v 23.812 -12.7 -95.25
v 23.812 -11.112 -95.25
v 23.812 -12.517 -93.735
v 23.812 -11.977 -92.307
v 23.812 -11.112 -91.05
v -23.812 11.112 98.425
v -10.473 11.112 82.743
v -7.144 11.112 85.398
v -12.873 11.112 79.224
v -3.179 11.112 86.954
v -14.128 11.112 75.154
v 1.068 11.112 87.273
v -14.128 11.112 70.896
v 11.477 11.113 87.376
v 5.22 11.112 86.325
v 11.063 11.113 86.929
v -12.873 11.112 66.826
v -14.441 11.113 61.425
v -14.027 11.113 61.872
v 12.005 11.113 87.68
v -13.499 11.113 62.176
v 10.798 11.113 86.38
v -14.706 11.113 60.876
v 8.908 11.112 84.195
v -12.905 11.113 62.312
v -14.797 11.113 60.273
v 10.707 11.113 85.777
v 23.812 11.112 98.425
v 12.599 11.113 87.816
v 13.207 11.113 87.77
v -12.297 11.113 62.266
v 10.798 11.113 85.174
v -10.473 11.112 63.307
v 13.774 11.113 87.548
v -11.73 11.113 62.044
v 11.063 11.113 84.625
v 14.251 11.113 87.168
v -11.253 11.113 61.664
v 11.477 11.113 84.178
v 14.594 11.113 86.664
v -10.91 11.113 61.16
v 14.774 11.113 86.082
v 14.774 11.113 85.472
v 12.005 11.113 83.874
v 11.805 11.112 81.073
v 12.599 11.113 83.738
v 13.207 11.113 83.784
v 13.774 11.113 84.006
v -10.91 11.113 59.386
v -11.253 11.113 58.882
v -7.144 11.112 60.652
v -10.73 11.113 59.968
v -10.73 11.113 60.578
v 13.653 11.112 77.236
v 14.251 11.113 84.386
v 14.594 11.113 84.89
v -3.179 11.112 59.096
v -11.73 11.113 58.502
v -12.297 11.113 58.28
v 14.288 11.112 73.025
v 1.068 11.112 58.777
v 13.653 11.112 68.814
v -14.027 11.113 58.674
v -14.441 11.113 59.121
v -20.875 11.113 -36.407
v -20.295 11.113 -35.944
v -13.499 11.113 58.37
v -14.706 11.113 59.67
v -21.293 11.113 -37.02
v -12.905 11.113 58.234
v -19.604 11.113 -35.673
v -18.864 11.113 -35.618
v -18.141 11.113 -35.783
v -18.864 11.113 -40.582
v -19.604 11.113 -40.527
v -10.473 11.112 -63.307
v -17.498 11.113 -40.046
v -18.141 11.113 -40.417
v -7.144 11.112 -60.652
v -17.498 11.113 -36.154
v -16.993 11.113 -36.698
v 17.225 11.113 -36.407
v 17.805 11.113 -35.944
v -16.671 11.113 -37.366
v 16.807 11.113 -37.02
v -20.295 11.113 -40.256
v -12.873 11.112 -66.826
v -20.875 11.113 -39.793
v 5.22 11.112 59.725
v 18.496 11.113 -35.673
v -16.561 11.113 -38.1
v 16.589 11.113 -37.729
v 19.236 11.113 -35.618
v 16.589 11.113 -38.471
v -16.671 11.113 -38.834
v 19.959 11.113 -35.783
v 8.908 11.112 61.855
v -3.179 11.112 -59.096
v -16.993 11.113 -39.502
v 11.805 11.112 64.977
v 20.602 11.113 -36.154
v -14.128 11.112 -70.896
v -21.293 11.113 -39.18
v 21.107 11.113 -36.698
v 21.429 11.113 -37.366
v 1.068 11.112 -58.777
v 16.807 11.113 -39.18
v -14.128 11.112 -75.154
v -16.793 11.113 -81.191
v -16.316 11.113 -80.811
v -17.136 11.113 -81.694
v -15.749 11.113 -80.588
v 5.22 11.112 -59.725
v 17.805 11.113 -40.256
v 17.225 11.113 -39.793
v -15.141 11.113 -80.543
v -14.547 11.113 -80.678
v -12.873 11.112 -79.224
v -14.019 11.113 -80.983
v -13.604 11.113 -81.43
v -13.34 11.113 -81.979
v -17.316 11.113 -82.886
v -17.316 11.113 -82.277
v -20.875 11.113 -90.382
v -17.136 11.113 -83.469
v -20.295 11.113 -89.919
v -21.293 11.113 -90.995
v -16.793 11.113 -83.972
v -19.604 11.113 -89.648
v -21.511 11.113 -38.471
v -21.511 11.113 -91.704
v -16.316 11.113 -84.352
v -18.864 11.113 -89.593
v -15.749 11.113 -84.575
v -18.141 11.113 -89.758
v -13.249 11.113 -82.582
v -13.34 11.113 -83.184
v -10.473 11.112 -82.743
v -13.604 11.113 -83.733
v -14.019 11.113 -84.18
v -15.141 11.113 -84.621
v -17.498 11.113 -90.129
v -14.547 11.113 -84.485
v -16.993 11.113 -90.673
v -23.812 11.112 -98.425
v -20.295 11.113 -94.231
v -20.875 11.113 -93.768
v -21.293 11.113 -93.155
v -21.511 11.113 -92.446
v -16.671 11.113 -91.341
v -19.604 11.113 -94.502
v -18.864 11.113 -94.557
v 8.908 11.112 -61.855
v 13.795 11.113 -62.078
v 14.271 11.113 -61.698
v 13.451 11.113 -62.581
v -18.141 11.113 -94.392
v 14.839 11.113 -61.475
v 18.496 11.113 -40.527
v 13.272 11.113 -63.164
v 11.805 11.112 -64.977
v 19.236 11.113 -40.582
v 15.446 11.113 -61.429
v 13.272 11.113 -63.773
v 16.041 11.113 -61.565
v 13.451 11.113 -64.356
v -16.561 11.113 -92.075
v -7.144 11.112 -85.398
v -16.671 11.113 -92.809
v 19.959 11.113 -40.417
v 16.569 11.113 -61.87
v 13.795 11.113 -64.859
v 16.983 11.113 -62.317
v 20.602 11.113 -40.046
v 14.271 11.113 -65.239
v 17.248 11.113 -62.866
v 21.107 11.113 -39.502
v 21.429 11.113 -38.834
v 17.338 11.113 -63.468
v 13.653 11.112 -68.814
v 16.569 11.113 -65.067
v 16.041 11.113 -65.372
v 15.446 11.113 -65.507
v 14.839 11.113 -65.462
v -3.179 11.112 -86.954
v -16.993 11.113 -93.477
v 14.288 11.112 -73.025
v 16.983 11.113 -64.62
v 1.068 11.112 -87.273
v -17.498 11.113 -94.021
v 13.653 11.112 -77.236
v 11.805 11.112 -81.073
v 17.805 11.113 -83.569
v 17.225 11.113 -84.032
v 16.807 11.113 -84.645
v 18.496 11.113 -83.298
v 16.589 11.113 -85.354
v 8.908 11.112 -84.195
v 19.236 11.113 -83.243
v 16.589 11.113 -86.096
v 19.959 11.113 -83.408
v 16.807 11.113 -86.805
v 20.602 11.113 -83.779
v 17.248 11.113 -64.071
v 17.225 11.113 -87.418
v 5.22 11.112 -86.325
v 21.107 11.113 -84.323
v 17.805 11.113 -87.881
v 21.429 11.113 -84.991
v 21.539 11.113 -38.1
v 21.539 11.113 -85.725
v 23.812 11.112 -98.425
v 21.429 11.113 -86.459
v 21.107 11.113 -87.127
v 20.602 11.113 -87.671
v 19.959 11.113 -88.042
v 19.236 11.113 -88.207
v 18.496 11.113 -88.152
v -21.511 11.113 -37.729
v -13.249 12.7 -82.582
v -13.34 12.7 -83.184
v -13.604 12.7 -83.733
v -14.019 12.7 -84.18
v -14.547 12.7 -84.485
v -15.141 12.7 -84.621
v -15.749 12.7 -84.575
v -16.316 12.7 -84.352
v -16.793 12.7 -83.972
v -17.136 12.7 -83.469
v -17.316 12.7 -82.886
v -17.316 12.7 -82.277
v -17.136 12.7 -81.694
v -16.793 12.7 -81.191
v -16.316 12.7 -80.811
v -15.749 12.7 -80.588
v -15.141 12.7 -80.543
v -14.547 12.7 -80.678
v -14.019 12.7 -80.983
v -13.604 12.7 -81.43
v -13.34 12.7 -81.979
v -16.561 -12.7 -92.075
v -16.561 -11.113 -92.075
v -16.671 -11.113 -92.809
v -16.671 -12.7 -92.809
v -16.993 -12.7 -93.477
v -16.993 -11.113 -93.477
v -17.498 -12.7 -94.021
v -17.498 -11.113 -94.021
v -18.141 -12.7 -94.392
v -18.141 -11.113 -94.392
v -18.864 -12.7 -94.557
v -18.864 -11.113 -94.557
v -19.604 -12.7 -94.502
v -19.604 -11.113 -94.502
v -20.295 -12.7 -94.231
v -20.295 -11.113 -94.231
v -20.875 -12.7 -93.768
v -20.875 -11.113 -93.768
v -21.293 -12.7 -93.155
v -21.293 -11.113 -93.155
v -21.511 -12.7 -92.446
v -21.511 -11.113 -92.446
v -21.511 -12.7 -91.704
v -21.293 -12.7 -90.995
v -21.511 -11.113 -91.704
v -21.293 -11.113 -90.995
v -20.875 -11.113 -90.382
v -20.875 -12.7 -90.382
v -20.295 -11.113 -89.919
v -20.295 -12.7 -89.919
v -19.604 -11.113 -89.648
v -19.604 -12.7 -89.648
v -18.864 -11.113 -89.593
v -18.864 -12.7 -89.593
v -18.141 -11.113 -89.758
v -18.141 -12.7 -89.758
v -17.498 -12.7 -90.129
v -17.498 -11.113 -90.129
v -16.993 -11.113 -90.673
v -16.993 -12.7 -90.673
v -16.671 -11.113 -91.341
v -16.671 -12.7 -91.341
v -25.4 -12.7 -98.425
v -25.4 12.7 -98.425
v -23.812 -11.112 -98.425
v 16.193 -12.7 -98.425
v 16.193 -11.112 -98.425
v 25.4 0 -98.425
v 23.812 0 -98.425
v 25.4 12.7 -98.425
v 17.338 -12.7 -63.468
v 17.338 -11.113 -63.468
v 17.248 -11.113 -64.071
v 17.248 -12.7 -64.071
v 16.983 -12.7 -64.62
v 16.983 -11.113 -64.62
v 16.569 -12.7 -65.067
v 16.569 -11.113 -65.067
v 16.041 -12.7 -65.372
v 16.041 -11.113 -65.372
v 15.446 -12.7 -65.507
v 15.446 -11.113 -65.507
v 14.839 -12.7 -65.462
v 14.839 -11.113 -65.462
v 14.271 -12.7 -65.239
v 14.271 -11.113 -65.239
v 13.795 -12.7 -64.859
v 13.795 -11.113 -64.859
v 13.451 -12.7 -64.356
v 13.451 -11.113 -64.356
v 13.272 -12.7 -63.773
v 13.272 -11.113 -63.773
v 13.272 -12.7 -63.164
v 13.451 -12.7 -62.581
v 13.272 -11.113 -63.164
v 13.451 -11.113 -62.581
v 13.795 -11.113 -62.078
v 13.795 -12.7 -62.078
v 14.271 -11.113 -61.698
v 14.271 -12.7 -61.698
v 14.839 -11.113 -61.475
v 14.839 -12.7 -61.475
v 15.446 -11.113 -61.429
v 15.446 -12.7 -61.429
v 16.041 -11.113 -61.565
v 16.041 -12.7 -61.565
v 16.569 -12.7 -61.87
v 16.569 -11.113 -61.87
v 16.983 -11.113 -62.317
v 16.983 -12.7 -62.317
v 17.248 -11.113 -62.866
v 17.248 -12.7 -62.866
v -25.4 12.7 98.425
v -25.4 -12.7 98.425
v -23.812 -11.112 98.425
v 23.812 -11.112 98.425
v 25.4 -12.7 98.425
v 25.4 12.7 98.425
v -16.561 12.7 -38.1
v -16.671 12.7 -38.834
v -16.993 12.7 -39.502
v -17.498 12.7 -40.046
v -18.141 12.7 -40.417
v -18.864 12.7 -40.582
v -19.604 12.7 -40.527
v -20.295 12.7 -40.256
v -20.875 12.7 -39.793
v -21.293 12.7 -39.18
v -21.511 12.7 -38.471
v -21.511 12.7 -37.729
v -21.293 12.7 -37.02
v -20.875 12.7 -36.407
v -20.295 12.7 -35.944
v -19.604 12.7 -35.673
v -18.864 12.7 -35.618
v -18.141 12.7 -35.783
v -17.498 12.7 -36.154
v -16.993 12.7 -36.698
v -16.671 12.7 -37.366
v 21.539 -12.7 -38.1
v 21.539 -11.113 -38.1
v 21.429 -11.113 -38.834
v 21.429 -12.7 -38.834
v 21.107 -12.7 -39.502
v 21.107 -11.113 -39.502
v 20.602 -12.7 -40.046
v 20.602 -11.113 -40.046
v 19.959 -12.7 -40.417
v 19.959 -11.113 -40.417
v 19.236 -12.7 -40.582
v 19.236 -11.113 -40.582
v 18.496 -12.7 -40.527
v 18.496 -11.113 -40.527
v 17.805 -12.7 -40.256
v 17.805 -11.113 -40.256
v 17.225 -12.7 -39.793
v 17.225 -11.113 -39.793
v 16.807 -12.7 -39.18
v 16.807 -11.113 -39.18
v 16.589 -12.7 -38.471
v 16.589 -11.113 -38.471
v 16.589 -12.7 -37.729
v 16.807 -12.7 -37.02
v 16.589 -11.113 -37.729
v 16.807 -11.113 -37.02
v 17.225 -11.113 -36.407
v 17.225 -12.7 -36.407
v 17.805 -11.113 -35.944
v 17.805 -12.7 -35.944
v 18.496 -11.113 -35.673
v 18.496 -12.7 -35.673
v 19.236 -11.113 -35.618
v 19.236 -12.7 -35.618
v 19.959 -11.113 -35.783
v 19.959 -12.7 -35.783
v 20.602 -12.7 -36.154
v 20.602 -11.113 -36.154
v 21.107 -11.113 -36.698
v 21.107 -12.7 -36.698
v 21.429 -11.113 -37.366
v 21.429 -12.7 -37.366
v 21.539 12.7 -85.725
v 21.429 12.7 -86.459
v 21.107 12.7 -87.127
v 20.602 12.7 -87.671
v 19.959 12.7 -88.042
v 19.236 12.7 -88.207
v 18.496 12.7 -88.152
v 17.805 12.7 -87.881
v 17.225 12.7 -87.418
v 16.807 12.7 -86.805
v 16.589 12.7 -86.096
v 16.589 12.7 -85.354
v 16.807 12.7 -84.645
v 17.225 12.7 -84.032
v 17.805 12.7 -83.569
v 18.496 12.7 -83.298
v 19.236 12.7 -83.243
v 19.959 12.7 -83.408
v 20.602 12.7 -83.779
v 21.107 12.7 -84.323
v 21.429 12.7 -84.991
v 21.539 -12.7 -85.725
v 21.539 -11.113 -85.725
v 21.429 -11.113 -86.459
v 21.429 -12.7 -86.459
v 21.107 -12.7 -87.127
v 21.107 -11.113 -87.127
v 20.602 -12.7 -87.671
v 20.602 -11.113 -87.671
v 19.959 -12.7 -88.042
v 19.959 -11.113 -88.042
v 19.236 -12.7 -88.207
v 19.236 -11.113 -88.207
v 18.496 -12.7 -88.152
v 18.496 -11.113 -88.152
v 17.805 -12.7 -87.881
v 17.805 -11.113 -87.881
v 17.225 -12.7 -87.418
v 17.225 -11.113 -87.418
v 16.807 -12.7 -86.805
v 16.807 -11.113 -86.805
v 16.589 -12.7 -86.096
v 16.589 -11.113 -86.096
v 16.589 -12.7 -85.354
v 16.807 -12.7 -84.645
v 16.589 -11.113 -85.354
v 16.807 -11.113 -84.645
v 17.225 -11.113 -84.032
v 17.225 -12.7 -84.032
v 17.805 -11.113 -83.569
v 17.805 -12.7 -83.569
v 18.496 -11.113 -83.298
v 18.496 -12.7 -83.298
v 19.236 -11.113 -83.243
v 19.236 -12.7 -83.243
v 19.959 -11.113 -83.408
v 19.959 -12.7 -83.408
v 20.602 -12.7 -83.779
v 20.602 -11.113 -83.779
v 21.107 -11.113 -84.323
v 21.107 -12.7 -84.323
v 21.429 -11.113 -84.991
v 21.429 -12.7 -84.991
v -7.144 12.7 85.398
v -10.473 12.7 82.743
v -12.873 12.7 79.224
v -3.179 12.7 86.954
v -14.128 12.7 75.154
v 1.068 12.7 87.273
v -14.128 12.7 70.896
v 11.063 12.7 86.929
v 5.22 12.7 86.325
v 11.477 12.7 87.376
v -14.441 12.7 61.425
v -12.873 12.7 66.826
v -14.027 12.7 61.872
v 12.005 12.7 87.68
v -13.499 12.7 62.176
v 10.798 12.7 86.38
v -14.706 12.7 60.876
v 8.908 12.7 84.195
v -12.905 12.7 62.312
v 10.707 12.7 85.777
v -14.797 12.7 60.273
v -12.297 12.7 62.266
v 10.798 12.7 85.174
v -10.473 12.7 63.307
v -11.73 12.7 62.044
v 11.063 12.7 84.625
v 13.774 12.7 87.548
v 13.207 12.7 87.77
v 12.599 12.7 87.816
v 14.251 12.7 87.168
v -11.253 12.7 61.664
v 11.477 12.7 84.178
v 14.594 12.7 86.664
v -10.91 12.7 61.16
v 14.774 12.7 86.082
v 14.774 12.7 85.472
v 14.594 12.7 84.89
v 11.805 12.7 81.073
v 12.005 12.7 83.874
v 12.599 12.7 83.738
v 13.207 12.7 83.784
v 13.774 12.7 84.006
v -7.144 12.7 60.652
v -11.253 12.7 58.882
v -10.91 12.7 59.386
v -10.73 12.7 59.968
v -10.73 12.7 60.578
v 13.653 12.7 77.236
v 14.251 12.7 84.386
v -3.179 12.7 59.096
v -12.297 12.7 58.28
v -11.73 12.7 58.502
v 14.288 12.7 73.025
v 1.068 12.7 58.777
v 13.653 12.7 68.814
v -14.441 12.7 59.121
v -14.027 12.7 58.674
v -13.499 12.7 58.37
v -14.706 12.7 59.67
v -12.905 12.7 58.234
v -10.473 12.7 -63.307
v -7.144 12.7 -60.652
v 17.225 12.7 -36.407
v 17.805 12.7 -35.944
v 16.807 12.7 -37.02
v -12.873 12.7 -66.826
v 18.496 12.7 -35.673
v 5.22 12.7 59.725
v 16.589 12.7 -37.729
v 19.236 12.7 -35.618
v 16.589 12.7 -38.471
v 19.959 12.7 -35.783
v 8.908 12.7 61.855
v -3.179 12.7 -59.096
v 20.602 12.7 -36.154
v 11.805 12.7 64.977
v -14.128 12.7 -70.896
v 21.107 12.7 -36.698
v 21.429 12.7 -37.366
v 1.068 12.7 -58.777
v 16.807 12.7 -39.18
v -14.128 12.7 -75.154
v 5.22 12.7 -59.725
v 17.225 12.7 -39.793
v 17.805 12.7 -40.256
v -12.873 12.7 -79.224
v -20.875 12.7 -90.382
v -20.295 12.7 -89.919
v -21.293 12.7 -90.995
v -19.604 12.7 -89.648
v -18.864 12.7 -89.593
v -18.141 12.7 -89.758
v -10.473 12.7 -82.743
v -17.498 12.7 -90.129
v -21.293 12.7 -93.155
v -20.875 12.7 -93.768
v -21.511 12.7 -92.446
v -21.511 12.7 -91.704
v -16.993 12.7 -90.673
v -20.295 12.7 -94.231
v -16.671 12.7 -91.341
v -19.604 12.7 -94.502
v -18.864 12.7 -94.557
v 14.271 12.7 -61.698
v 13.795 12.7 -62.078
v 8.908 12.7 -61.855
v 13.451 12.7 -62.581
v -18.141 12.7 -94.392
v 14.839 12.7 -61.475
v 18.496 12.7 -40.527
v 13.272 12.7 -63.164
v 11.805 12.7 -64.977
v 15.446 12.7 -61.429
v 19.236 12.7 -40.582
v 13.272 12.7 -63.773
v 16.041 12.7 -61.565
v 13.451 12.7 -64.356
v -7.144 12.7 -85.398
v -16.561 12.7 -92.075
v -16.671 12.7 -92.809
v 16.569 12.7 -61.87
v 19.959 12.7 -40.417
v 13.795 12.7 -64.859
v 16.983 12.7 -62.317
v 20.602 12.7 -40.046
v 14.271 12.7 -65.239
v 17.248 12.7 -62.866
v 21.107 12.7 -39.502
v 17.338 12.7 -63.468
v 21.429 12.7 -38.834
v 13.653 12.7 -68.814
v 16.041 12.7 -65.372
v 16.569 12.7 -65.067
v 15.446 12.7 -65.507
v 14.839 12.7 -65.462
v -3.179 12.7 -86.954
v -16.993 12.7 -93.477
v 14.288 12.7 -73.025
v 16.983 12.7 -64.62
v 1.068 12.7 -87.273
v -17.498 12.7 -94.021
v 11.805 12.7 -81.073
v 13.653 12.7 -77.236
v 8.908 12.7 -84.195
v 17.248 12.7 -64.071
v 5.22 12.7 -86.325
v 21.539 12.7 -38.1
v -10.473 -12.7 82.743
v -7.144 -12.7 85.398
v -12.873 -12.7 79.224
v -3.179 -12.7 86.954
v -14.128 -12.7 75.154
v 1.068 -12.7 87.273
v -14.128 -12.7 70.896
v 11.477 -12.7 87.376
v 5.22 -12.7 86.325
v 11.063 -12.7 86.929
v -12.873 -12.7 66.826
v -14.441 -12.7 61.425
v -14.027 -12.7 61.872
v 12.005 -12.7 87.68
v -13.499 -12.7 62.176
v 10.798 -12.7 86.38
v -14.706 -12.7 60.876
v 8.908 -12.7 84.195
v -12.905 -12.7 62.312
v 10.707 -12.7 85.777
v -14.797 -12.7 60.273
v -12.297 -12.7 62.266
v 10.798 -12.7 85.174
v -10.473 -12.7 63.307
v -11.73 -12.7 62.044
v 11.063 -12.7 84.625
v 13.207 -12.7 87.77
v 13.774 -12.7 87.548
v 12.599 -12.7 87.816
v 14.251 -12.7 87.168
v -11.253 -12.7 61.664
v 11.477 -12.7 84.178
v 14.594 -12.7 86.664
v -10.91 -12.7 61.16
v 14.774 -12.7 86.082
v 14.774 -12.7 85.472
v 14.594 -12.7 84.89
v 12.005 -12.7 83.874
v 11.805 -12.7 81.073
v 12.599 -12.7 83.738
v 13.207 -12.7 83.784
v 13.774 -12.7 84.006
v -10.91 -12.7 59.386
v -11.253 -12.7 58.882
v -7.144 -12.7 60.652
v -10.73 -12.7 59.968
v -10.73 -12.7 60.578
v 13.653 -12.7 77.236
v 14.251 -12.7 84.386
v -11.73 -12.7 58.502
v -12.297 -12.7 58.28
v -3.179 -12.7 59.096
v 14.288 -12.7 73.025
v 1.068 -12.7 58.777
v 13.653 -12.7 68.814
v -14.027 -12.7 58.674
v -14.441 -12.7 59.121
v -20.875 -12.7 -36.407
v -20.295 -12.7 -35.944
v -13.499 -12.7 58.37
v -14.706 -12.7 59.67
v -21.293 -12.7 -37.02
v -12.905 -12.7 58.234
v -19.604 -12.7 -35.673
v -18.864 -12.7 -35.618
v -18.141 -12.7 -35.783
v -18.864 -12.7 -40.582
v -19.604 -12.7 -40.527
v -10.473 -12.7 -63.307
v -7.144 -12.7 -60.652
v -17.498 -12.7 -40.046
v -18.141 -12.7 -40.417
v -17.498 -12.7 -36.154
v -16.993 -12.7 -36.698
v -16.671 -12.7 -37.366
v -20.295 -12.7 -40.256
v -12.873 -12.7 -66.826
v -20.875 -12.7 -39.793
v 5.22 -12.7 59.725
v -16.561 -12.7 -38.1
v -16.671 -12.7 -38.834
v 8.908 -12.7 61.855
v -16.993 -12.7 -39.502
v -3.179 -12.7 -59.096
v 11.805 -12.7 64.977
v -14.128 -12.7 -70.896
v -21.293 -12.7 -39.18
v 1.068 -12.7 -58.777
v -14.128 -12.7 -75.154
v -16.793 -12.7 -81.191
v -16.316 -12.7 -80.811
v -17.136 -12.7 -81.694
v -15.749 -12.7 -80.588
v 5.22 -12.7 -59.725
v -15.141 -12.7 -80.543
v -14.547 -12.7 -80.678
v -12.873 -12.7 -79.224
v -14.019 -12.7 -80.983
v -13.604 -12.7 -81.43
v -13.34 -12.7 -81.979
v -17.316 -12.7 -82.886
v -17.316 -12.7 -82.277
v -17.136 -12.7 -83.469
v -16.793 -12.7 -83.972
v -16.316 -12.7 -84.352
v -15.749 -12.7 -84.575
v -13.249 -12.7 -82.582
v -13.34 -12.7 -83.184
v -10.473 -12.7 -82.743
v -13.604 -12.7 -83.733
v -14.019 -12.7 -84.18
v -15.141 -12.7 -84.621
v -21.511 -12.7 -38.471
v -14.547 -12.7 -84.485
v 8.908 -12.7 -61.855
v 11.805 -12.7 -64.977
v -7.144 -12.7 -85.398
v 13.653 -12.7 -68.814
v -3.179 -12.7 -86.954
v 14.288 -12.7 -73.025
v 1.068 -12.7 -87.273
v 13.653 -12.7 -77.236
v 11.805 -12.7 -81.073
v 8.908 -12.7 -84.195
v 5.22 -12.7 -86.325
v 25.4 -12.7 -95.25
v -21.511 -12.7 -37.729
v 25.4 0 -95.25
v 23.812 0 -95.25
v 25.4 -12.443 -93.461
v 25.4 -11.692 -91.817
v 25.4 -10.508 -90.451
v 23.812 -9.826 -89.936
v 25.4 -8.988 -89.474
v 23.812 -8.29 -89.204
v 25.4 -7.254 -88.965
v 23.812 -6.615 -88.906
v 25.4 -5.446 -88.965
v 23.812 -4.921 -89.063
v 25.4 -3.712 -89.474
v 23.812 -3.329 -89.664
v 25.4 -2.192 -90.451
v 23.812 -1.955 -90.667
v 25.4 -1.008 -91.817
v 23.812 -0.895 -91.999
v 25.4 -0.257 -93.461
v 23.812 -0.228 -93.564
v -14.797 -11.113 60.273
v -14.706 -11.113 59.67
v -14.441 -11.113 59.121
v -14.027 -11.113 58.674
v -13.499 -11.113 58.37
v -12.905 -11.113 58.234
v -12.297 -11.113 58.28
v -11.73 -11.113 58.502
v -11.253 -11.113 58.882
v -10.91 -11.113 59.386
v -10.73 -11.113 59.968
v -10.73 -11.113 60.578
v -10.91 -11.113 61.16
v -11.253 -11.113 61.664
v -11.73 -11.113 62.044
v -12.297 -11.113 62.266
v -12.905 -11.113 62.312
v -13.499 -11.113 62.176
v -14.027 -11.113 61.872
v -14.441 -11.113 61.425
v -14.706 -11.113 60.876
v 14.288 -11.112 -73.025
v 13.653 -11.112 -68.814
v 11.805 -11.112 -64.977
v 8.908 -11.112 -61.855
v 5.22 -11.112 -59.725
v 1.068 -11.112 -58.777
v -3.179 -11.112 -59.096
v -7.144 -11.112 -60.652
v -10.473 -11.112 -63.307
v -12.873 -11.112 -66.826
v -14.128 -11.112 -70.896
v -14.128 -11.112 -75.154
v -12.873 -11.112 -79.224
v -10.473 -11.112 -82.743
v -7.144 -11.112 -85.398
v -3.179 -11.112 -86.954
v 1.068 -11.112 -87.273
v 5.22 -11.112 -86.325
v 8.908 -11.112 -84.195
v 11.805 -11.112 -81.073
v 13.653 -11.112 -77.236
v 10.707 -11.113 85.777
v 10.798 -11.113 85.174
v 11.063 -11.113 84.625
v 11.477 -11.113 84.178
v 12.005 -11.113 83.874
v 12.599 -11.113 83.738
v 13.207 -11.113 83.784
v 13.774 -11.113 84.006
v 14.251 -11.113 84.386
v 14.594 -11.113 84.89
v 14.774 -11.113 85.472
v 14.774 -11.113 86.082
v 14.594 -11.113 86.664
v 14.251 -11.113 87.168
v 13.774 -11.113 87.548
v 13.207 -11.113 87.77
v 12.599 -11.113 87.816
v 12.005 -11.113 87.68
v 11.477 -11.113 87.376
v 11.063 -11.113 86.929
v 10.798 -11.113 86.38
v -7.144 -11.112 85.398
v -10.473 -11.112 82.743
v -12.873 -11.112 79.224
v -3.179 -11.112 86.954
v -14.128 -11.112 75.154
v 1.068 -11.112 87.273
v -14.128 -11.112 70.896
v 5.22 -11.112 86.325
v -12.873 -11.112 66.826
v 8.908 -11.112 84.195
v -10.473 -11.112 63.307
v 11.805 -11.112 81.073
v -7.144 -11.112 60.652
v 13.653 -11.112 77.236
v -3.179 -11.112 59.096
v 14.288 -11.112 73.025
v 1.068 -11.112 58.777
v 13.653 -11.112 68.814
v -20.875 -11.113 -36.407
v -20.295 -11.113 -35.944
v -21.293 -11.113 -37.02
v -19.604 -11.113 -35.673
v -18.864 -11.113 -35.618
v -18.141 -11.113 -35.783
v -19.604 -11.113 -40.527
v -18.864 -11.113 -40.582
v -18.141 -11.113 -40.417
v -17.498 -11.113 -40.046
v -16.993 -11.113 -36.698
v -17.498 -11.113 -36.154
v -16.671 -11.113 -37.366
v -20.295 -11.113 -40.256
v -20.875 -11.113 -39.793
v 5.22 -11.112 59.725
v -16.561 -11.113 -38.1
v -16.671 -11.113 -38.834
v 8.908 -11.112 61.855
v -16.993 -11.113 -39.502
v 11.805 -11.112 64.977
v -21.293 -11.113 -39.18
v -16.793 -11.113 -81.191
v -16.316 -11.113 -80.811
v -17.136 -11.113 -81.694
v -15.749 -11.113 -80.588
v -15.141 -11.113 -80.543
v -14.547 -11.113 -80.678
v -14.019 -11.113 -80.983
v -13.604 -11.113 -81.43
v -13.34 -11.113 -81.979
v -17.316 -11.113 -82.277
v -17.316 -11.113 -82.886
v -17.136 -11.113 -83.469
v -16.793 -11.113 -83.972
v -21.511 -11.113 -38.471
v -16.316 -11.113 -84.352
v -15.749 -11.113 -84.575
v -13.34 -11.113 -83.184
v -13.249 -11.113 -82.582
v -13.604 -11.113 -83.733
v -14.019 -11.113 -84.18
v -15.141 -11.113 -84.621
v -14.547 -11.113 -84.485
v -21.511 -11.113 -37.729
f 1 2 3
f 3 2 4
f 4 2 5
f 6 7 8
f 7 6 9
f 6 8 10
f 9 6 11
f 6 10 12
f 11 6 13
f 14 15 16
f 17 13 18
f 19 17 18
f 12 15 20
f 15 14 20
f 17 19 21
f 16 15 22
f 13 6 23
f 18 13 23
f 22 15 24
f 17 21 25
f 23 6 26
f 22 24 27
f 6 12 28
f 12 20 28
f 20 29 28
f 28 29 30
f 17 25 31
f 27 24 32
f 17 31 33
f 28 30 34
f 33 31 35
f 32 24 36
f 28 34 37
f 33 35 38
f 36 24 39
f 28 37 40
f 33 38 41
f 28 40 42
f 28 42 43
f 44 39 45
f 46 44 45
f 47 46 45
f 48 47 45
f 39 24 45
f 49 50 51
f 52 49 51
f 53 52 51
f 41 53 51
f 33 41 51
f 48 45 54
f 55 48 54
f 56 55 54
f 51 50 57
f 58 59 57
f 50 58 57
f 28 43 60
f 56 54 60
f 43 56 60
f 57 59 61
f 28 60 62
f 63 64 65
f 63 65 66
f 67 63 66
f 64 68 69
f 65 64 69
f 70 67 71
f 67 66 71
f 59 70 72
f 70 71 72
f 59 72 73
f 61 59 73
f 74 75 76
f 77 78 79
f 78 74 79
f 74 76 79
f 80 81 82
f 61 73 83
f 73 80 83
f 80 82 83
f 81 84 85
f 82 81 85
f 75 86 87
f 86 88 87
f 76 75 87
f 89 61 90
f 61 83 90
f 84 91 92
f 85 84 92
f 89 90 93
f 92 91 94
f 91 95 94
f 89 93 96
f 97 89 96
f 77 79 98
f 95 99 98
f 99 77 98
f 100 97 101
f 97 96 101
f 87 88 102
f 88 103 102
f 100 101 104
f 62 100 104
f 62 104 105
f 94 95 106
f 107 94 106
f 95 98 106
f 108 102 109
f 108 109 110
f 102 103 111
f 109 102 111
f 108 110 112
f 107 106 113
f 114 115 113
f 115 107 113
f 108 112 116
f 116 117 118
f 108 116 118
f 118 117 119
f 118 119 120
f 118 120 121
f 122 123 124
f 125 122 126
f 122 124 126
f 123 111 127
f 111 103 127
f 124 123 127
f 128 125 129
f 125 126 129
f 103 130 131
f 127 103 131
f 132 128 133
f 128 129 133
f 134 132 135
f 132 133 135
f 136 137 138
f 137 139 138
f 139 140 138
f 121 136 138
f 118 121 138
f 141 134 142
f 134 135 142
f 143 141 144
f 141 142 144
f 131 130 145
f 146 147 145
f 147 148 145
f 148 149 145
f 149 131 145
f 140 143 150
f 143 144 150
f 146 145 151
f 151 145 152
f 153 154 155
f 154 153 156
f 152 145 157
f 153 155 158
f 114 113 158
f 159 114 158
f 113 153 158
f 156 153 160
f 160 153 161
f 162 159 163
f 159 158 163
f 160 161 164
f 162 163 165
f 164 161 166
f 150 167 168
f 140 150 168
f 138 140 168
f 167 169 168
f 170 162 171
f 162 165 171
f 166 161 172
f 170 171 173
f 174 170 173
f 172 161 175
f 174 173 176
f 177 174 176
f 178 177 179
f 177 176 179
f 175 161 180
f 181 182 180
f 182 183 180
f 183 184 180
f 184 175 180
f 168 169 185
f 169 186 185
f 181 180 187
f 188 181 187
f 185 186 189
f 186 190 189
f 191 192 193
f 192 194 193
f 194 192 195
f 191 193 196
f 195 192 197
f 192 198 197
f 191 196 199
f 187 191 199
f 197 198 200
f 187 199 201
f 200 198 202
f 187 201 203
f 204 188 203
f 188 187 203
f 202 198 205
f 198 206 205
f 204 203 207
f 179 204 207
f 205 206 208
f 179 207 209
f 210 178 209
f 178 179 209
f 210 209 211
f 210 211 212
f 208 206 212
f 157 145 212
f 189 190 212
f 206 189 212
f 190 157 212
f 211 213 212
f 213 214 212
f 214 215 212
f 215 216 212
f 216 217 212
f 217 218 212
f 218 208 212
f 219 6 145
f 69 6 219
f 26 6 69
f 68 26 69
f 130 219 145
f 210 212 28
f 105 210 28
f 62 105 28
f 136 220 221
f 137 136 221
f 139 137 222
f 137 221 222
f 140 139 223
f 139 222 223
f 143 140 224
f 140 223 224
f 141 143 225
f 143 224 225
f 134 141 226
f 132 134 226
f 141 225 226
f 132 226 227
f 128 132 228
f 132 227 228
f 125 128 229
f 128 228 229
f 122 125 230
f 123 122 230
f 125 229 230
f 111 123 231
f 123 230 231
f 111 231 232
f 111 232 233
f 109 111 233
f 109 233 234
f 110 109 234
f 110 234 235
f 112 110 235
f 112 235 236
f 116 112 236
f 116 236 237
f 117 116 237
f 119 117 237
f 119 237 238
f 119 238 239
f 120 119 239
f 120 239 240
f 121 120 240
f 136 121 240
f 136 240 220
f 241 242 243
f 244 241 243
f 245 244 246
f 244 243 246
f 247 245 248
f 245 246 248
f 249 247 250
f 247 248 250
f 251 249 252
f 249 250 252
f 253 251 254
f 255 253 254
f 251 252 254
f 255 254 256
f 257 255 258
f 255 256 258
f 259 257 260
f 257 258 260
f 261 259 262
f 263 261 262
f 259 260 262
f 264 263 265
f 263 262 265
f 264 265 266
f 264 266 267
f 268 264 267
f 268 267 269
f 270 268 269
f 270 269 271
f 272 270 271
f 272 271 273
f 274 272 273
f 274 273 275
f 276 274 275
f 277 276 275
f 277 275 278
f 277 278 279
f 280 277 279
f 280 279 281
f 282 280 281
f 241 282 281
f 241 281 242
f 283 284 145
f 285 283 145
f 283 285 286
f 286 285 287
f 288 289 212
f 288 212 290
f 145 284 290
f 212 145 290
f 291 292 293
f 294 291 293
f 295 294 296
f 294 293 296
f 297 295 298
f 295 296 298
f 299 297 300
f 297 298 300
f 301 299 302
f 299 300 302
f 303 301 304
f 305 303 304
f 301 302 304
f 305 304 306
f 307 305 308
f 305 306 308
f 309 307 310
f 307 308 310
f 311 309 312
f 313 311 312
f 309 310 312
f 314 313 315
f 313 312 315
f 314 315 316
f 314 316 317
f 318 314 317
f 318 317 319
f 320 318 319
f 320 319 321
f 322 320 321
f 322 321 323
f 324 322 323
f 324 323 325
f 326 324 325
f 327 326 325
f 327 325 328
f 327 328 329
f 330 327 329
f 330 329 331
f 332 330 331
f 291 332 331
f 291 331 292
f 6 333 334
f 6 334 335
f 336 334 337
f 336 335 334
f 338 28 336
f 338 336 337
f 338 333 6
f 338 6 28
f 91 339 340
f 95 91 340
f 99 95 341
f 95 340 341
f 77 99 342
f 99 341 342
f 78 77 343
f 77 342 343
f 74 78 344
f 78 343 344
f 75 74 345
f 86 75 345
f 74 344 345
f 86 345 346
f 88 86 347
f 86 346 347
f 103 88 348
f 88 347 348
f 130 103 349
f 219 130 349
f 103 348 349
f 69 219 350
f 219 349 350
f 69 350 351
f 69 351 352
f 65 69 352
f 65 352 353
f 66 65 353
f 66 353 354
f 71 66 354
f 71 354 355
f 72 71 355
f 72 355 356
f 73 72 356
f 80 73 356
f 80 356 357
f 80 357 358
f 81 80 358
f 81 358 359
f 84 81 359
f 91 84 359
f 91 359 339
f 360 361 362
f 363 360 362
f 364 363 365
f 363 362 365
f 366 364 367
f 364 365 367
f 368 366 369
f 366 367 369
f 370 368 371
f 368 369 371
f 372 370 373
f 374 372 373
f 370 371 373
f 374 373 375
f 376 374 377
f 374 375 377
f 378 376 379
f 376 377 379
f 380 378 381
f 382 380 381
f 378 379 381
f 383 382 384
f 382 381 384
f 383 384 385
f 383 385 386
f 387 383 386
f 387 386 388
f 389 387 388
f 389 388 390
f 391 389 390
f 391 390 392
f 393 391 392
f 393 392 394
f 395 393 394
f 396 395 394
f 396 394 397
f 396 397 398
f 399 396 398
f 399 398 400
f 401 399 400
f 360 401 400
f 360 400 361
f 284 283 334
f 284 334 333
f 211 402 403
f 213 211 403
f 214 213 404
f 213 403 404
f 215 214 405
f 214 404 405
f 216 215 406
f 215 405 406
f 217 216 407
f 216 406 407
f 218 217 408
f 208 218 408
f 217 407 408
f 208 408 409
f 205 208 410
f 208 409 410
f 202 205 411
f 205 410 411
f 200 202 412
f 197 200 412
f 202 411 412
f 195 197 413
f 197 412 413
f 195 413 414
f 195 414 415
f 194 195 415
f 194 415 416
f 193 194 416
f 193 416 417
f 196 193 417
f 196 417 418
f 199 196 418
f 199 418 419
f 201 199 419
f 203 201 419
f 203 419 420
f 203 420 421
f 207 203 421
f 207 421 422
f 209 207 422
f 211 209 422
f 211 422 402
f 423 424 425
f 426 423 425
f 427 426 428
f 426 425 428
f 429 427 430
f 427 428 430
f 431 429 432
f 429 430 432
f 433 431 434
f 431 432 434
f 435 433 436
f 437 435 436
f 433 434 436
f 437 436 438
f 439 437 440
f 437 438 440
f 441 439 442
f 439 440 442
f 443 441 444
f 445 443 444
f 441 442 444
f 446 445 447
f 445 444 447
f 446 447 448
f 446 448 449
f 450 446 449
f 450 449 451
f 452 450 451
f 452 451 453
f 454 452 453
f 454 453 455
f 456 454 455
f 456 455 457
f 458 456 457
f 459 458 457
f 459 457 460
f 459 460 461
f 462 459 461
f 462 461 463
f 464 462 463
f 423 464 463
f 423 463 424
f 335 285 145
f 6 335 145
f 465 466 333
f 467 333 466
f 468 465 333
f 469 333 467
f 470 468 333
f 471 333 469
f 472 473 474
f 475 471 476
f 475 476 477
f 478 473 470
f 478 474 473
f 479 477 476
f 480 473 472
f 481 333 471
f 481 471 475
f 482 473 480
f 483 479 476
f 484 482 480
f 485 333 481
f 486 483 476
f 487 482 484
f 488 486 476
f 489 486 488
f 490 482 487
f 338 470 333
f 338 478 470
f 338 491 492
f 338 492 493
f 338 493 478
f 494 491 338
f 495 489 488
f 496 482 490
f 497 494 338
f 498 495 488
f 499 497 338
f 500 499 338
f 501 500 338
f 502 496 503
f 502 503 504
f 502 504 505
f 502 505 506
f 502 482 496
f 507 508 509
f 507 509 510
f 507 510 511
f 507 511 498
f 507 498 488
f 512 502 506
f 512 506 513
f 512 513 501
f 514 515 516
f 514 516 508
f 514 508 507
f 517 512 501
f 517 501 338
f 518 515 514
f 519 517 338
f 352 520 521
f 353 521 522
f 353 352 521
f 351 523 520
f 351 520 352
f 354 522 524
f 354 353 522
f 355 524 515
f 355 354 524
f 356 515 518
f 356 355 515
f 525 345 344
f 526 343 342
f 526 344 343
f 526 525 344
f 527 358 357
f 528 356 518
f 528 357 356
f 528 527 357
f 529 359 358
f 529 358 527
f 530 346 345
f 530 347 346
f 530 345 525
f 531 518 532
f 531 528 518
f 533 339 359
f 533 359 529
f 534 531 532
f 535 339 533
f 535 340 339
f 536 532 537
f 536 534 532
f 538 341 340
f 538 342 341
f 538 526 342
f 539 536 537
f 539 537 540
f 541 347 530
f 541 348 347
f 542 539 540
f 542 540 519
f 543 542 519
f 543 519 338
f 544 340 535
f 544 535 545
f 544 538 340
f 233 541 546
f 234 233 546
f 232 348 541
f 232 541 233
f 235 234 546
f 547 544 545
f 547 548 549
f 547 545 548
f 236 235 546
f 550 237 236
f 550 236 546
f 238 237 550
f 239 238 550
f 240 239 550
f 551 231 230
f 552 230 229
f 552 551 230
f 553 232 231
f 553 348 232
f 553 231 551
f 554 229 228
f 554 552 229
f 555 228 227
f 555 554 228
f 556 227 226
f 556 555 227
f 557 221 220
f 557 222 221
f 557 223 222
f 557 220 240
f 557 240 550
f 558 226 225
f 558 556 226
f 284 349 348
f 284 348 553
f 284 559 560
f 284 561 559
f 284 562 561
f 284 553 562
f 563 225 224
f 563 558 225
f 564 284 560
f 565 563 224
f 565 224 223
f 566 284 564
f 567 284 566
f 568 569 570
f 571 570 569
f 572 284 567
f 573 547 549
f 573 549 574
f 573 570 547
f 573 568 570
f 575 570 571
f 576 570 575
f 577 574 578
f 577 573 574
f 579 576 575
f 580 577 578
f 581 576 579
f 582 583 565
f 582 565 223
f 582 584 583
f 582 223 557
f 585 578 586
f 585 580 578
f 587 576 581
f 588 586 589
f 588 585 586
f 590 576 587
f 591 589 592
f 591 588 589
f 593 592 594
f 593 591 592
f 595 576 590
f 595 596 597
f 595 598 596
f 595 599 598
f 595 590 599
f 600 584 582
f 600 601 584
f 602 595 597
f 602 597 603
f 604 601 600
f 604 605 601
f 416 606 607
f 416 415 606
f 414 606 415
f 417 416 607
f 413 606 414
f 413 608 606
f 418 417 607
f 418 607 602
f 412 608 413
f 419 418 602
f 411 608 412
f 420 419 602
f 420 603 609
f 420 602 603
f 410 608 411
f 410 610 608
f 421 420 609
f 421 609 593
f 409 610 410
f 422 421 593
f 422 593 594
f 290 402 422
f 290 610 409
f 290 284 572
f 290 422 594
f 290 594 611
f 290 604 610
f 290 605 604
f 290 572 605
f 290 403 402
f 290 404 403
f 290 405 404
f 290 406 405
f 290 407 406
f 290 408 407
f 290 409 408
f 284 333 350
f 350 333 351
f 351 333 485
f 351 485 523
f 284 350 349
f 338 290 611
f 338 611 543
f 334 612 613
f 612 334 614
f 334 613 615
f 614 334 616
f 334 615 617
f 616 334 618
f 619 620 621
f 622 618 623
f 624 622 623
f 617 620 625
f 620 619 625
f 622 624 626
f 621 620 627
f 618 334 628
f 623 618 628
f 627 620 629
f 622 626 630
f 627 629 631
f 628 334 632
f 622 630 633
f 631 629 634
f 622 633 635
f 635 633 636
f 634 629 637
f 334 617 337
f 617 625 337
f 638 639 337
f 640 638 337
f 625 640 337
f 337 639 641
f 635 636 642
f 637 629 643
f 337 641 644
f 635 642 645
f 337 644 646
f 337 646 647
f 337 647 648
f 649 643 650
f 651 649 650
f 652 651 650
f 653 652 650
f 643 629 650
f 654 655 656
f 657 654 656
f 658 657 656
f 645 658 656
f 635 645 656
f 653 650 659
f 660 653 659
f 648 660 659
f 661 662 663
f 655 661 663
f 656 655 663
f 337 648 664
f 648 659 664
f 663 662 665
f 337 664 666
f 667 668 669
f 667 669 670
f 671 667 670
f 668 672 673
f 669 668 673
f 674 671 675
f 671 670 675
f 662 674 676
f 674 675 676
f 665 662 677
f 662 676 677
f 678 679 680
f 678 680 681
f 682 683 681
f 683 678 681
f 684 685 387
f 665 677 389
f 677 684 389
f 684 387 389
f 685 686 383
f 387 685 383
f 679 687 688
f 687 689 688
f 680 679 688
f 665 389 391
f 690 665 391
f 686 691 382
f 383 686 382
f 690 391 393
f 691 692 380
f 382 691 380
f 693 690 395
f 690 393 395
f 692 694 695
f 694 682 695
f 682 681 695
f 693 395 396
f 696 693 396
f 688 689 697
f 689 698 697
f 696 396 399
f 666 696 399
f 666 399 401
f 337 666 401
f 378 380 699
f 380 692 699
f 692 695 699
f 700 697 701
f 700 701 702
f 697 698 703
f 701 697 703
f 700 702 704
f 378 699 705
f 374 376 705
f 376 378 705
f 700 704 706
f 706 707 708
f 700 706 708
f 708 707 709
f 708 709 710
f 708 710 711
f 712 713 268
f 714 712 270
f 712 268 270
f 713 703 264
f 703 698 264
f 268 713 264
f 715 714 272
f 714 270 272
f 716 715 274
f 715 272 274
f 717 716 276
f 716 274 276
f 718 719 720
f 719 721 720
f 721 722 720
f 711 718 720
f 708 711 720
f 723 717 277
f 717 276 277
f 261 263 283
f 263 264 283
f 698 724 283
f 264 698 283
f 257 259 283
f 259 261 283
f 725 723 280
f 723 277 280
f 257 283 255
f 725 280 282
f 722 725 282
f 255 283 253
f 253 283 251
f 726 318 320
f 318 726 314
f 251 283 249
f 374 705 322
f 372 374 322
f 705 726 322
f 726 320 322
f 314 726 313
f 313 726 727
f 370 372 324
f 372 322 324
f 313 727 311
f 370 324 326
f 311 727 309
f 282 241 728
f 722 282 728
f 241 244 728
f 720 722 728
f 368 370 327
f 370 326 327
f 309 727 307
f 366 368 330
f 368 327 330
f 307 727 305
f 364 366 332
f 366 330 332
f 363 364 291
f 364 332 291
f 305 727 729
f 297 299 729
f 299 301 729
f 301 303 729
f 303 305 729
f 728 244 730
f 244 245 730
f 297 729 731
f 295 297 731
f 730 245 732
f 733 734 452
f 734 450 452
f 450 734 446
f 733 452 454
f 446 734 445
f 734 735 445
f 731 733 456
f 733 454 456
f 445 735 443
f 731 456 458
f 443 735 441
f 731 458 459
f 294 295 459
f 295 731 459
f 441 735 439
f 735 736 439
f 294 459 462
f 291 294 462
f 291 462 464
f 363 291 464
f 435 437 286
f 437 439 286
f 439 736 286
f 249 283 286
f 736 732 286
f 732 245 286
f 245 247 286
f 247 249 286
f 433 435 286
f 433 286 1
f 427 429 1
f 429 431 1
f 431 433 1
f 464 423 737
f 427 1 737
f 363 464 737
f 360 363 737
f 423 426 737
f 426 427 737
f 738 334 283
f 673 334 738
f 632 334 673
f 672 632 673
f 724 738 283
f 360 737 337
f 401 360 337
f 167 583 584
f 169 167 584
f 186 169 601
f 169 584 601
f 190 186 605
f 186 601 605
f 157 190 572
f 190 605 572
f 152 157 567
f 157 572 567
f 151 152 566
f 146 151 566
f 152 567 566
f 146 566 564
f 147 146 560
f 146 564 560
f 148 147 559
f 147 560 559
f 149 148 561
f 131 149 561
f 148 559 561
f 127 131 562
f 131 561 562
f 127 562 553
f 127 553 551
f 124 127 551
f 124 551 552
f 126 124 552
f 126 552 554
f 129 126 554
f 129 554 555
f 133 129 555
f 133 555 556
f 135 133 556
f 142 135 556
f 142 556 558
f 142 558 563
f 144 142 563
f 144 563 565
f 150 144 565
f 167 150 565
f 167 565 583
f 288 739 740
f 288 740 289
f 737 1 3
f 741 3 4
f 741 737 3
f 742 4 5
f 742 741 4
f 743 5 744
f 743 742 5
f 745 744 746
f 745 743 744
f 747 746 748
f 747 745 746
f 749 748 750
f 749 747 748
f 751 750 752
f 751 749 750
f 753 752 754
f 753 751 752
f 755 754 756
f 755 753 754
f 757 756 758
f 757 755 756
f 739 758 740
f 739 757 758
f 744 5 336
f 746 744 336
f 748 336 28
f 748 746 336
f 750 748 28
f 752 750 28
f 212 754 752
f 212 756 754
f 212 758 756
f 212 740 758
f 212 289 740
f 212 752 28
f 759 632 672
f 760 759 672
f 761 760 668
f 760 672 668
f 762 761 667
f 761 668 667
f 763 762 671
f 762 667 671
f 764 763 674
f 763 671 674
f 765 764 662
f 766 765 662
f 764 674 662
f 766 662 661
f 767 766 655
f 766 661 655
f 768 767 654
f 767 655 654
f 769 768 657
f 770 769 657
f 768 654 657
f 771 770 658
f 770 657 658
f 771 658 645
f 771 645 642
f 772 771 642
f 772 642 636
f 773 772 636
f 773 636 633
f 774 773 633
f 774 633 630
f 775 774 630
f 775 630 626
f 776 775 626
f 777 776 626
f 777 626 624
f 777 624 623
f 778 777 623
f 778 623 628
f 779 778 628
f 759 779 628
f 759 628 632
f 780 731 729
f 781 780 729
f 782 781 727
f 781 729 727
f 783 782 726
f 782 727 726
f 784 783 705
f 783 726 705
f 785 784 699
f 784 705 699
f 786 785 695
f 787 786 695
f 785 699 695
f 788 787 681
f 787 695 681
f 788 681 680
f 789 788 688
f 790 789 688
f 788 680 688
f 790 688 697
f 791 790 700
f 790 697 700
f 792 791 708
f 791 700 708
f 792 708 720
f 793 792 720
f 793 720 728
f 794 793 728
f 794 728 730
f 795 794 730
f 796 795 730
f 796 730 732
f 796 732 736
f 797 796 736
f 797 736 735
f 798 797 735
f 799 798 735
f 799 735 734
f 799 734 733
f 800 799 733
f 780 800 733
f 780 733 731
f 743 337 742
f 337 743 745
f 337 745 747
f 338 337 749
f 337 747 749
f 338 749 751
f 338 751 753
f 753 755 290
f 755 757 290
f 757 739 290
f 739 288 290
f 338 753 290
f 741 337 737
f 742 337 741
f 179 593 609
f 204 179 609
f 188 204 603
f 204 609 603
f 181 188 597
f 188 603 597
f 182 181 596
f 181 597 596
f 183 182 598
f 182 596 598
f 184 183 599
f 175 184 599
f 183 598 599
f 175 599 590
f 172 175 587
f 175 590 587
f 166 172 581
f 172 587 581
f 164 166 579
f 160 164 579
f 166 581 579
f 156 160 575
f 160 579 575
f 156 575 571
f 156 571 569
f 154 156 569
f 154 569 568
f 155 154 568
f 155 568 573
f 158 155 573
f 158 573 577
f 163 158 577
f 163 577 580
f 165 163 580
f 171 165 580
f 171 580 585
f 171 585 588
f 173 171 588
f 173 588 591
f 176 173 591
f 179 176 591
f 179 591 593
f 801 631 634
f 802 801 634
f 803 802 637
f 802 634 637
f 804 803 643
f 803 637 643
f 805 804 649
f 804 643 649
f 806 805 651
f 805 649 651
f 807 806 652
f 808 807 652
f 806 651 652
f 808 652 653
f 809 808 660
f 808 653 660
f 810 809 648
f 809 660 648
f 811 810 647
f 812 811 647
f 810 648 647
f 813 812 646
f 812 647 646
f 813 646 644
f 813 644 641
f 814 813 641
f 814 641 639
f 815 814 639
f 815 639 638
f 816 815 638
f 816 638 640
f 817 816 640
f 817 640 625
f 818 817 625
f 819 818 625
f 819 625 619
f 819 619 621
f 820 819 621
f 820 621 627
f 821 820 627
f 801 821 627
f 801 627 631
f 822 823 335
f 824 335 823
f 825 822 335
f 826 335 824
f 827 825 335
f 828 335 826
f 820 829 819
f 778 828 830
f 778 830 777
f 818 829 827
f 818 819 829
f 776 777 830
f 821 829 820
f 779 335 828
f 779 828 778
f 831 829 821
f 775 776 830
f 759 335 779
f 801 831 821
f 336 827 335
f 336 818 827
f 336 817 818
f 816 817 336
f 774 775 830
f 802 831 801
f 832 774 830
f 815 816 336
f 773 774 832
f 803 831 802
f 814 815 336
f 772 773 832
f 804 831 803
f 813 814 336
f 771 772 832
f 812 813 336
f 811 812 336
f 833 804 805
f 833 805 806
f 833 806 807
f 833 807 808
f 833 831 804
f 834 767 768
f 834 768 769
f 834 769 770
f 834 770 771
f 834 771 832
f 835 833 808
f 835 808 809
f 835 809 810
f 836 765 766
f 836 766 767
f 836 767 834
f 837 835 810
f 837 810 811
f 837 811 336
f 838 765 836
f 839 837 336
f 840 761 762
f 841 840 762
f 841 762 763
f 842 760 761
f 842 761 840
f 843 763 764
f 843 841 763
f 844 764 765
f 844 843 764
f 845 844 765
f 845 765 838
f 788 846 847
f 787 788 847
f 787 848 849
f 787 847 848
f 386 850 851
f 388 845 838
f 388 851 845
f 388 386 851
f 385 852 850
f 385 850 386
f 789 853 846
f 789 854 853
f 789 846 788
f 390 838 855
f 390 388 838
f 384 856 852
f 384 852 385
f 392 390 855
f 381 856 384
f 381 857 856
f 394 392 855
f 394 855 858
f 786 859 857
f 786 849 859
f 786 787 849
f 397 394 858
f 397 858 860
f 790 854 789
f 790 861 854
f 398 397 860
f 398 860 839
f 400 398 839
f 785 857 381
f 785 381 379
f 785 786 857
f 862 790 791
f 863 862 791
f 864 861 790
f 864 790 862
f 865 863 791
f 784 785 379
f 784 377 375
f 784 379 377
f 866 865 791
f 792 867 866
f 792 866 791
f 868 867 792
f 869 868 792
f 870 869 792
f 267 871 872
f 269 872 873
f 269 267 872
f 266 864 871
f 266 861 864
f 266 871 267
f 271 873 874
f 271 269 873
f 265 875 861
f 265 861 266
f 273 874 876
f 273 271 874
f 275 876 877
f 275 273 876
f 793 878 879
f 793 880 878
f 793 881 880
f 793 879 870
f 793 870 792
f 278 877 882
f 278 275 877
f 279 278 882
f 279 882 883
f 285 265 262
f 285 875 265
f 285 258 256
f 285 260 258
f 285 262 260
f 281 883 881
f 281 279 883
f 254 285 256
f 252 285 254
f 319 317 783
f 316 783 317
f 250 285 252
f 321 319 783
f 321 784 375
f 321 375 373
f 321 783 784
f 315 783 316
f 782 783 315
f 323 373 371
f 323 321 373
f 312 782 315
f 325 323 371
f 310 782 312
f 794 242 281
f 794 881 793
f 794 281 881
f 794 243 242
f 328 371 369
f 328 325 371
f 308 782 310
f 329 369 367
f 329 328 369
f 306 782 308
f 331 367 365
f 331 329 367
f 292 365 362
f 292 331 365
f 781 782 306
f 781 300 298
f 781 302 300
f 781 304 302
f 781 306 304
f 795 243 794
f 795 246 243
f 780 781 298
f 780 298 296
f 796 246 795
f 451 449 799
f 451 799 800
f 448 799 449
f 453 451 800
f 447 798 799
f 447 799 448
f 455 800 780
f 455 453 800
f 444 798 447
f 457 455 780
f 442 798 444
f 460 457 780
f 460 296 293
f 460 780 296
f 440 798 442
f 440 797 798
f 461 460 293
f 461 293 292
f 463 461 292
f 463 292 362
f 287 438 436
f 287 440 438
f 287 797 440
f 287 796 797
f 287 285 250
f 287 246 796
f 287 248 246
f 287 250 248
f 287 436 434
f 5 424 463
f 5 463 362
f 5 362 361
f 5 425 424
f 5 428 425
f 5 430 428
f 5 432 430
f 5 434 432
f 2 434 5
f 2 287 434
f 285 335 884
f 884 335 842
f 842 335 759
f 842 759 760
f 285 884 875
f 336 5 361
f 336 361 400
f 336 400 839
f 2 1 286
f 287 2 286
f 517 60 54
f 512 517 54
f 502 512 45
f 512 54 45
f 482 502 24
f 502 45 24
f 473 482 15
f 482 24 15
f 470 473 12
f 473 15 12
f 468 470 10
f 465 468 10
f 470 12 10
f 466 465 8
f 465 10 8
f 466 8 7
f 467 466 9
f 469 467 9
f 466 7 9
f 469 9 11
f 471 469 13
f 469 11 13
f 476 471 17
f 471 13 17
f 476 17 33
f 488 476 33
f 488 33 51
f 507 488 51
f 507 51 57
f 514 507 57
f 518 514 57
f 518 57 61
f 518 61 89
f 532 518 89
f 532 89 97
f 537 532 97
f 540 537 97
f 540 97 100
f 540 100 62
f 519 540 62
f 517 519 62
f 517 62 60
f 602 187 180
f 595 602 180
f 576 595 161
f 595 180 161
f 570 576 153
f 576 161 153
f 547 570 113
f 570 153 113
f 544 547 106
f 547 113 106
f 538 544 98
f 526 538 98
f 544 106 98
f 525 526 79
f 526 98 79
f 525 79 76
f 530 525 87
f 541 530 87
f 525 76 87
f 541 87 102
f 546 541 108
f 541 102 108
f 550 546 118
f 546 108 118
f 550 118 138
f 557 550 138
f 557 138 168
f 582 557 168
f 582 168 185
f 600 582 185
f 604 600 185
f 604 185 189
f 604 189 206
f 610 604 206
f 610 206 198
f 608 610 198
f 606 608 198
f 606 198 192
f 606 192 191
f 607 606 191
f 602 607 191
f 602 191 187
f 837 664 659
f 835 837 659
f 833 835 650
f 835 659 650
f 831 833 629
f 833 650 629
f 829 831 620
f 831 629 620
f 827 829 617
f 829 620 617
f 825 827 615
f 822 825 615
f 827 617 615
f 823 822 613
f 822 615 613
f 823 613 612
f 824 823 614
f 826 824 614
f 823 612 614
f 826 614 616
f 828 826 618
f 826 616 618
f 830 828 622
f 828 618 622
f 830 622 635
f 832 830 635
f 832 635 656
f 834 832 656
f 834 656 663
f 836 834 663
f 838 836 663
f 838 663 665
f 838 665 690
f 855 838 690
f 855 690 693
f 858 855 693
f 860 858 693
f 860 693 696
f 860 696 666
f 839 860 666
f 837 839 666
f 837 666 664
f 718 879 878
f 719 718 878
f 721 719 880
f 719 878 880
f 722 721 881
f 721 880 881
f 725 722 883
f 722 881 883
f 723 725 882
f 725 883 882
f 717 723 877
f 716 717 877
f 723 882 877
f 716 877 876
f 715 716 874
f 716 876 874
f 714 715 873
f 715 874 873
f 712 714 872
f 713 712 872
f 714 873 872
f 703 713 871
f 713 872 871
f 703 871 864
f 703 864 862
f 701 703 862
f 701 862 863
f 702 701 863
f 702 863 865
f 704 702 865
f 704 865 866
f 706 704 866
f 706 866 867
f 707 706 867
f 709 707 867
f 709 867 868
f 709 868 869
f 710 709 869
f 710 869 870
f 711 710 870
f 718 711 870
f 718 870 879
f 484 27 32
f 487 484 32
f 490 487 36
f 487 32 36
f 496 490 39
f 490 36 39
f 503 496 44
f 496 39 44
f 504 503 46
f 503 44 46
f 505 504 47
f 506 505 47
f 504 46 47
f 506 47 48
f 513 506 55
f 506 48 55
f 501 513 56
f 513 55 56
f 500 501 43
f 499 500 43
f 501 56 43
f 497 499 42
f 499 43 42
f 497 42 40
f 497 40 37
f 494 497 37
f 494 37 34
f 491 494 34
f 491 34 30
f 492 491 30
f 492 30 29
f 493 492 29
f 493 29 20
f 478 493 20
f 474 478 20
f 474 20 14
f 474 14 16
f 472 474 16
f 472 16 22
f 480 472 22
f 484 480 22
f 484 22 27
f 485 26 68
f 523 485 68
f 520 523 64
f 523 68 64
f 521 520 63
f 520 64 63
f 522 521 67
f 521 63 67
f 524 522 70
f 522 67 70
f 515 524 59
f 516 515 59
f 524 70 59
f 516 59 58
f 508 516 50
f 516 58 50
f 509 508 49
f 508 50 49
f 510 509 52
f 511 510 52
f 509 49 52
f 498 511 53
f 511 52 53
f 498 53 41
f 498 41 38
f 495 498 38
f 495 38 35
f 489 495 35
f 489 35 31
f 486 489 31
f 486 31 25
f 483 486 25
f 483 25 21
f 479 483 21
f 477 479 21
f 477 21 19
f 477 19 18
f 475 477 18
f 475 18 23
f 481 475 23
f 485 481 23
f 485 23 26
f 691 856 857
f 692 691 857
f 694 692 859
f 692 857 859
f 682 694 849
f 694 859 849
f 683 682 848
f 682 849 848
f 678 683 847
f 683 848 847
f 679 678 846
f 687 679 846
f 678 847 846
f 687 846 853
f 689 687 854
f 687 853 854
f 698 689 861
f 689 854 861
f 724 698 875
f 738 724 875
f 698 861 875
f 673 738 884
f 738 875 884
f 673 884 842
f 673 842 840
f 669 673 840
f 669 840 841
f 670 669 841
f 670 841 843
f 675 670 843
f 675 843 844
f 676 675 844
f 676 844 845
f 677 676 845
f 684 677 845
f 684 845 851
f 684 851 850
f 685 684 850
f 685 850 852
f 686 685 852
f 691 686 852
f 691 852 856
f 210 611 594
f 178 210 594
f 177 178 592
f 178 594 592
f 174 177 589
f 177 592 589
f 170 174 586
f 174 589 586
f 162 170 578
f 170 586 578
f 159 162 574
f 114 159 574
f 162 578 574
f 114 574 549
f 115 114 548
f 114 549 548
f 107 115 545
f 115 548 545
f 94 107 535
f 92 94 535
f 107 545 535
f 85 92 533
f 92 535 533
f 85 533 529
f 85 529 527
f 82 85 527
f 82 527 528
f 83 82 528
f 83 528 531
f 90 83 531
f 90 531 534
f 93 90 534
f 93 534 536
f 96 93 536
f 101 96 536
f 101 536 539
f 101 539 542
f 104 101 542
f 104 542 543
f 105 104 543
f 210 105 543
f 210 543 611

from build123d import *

# Parameters (mm, degrees)
BOSS_EXTRUDE1_DEPTH         = 98.424999
BOSS_EXTRUDE1_DEPTH_BACK    = 98.424999
SKETCH3_W                   = 50.8
SKETCH3_H                   = 25.4
SKETCH3_W_2                 = 47.625
SKETCH3_H_2                 = 22.225
SKETCH4_R                   = 14.2875
CUT_EXTRUDE3_DEPTH          = 105.774999061
CUT_EXTRUDE5_DEPTH          = 1.5875
CUT_EXTRUDE6_DEPTH          = 1.5875
F_10_CLEARANCE_HOLE1_D      = 4.9784
F_20_0_161_DIAMETER_HOLE1_D = 4.0894
F_20_0_161_DIAMETER_HOLE2_D = 4.0894


with BuildPart() as part:
    # Sketch3 → Boss-Extrude1 (new, two sides: drawn at the far end of the back side and taken through both)
    with BuildSketch(Plane.XY.offset(-BOSS_EXTRUDE1_DEPTH_BACK)):
        Rectangle(SKETCH3_W, SKETCH3_H)
        Rectangle(SKETCH3_W_2, SKETCH3_H_2, mode=Mode.SUBTRACT)
    extrude(amount=BOSS_EXTRUDE1_DEPTH + BOSS_EXTRUDE1_DEPTH_BACK)

    # Sketch4 → Cut-Extrude3 (cut, through all)
    with BuildSketch(Plane.XZ.offset(12.7)):
        with Locations((0, 73.025)):
            Circle(SKETCH4_R)
        with Locations((0, -73.025)):
            Circle(SKETCH4_R)
    extrude(amount=-CUT_EXTRUDE3_DEPTH, mode=Mode.SUBTRACT)

    # Sketch5 → Cut-Extrude5 (cut)
    with BuildSketch(Plane(origin=(25.4, 0, 0), x_dir=(0, 0, -1), z_dir=(1, 0, 0))):
        with BuildLine():
            Line((98.424999492, 0), (98.424999492, -12.7))
            Line((98.424999492, -12.7), (95.249999492, -12.7))
            ThreePointArc((95.249999492, -12.7), (88.899999492, -6.35), (95.249999492, 0))
            Line((95.249999492, 0), (98.424999492, 0))
        make_face()
    extrude(amount=-CUT_EXTRUDE5_DEPTH, mode=Mode.SUBTRACT)

    # Sketch6 → Cut-Extrude6 (cut)
    with BuildSketch(Plane.XZ.offset(12.7)):
        Polygon((23.8125, -98.424999492), (23.8125, -95.249999492), (16.1925, -98.424999492), align=None)
    extrude(amount=-CUT_EXTRUDE6_DEPTH, mode=Mode.SUBTRACT)

    # #10 Clearance Hole1 (through all)
    with Locations(Plane(origin=(0, -12.7, 0), x_dir=(-1, 0, 0), z_dir=(0, -1, 0))):
        with Locations((-19.05, 85.724999492), (19.05, 92.074999492), (19.05, 38.099999492), (-19.05, 38.099999492)):
            Hole(F_10_CLEARANCE_HOLE1_D / 2)

    # #20 (0.161) Diameter Hole1 (through all)
    with Locations(Plane(origin=(0, -12.7, 0), x_dir=(-1, 0, 0), z_dir=(0, -1, 0))):
        with Locations((15.293699364, 82.581564015), (-15.293699364, 63.468435985)):
            Hole(F_20_0_161_DIAMETER_HOLE1_D / 2)

    # #20 (0.161) Diameter Hole2 (through all)
    with Locations(Plane(origin=(0, 12.7, 0), x_dir=(1, 0, 0), z_dir=(0, 1, 0))):
        with Locations((-12.751963692, -60.273036308), (12.751963692, -85.776963692)):
            Hole(F_20_0_161_DIAMETER_HOLE2_D / 2)


solid = part.part
